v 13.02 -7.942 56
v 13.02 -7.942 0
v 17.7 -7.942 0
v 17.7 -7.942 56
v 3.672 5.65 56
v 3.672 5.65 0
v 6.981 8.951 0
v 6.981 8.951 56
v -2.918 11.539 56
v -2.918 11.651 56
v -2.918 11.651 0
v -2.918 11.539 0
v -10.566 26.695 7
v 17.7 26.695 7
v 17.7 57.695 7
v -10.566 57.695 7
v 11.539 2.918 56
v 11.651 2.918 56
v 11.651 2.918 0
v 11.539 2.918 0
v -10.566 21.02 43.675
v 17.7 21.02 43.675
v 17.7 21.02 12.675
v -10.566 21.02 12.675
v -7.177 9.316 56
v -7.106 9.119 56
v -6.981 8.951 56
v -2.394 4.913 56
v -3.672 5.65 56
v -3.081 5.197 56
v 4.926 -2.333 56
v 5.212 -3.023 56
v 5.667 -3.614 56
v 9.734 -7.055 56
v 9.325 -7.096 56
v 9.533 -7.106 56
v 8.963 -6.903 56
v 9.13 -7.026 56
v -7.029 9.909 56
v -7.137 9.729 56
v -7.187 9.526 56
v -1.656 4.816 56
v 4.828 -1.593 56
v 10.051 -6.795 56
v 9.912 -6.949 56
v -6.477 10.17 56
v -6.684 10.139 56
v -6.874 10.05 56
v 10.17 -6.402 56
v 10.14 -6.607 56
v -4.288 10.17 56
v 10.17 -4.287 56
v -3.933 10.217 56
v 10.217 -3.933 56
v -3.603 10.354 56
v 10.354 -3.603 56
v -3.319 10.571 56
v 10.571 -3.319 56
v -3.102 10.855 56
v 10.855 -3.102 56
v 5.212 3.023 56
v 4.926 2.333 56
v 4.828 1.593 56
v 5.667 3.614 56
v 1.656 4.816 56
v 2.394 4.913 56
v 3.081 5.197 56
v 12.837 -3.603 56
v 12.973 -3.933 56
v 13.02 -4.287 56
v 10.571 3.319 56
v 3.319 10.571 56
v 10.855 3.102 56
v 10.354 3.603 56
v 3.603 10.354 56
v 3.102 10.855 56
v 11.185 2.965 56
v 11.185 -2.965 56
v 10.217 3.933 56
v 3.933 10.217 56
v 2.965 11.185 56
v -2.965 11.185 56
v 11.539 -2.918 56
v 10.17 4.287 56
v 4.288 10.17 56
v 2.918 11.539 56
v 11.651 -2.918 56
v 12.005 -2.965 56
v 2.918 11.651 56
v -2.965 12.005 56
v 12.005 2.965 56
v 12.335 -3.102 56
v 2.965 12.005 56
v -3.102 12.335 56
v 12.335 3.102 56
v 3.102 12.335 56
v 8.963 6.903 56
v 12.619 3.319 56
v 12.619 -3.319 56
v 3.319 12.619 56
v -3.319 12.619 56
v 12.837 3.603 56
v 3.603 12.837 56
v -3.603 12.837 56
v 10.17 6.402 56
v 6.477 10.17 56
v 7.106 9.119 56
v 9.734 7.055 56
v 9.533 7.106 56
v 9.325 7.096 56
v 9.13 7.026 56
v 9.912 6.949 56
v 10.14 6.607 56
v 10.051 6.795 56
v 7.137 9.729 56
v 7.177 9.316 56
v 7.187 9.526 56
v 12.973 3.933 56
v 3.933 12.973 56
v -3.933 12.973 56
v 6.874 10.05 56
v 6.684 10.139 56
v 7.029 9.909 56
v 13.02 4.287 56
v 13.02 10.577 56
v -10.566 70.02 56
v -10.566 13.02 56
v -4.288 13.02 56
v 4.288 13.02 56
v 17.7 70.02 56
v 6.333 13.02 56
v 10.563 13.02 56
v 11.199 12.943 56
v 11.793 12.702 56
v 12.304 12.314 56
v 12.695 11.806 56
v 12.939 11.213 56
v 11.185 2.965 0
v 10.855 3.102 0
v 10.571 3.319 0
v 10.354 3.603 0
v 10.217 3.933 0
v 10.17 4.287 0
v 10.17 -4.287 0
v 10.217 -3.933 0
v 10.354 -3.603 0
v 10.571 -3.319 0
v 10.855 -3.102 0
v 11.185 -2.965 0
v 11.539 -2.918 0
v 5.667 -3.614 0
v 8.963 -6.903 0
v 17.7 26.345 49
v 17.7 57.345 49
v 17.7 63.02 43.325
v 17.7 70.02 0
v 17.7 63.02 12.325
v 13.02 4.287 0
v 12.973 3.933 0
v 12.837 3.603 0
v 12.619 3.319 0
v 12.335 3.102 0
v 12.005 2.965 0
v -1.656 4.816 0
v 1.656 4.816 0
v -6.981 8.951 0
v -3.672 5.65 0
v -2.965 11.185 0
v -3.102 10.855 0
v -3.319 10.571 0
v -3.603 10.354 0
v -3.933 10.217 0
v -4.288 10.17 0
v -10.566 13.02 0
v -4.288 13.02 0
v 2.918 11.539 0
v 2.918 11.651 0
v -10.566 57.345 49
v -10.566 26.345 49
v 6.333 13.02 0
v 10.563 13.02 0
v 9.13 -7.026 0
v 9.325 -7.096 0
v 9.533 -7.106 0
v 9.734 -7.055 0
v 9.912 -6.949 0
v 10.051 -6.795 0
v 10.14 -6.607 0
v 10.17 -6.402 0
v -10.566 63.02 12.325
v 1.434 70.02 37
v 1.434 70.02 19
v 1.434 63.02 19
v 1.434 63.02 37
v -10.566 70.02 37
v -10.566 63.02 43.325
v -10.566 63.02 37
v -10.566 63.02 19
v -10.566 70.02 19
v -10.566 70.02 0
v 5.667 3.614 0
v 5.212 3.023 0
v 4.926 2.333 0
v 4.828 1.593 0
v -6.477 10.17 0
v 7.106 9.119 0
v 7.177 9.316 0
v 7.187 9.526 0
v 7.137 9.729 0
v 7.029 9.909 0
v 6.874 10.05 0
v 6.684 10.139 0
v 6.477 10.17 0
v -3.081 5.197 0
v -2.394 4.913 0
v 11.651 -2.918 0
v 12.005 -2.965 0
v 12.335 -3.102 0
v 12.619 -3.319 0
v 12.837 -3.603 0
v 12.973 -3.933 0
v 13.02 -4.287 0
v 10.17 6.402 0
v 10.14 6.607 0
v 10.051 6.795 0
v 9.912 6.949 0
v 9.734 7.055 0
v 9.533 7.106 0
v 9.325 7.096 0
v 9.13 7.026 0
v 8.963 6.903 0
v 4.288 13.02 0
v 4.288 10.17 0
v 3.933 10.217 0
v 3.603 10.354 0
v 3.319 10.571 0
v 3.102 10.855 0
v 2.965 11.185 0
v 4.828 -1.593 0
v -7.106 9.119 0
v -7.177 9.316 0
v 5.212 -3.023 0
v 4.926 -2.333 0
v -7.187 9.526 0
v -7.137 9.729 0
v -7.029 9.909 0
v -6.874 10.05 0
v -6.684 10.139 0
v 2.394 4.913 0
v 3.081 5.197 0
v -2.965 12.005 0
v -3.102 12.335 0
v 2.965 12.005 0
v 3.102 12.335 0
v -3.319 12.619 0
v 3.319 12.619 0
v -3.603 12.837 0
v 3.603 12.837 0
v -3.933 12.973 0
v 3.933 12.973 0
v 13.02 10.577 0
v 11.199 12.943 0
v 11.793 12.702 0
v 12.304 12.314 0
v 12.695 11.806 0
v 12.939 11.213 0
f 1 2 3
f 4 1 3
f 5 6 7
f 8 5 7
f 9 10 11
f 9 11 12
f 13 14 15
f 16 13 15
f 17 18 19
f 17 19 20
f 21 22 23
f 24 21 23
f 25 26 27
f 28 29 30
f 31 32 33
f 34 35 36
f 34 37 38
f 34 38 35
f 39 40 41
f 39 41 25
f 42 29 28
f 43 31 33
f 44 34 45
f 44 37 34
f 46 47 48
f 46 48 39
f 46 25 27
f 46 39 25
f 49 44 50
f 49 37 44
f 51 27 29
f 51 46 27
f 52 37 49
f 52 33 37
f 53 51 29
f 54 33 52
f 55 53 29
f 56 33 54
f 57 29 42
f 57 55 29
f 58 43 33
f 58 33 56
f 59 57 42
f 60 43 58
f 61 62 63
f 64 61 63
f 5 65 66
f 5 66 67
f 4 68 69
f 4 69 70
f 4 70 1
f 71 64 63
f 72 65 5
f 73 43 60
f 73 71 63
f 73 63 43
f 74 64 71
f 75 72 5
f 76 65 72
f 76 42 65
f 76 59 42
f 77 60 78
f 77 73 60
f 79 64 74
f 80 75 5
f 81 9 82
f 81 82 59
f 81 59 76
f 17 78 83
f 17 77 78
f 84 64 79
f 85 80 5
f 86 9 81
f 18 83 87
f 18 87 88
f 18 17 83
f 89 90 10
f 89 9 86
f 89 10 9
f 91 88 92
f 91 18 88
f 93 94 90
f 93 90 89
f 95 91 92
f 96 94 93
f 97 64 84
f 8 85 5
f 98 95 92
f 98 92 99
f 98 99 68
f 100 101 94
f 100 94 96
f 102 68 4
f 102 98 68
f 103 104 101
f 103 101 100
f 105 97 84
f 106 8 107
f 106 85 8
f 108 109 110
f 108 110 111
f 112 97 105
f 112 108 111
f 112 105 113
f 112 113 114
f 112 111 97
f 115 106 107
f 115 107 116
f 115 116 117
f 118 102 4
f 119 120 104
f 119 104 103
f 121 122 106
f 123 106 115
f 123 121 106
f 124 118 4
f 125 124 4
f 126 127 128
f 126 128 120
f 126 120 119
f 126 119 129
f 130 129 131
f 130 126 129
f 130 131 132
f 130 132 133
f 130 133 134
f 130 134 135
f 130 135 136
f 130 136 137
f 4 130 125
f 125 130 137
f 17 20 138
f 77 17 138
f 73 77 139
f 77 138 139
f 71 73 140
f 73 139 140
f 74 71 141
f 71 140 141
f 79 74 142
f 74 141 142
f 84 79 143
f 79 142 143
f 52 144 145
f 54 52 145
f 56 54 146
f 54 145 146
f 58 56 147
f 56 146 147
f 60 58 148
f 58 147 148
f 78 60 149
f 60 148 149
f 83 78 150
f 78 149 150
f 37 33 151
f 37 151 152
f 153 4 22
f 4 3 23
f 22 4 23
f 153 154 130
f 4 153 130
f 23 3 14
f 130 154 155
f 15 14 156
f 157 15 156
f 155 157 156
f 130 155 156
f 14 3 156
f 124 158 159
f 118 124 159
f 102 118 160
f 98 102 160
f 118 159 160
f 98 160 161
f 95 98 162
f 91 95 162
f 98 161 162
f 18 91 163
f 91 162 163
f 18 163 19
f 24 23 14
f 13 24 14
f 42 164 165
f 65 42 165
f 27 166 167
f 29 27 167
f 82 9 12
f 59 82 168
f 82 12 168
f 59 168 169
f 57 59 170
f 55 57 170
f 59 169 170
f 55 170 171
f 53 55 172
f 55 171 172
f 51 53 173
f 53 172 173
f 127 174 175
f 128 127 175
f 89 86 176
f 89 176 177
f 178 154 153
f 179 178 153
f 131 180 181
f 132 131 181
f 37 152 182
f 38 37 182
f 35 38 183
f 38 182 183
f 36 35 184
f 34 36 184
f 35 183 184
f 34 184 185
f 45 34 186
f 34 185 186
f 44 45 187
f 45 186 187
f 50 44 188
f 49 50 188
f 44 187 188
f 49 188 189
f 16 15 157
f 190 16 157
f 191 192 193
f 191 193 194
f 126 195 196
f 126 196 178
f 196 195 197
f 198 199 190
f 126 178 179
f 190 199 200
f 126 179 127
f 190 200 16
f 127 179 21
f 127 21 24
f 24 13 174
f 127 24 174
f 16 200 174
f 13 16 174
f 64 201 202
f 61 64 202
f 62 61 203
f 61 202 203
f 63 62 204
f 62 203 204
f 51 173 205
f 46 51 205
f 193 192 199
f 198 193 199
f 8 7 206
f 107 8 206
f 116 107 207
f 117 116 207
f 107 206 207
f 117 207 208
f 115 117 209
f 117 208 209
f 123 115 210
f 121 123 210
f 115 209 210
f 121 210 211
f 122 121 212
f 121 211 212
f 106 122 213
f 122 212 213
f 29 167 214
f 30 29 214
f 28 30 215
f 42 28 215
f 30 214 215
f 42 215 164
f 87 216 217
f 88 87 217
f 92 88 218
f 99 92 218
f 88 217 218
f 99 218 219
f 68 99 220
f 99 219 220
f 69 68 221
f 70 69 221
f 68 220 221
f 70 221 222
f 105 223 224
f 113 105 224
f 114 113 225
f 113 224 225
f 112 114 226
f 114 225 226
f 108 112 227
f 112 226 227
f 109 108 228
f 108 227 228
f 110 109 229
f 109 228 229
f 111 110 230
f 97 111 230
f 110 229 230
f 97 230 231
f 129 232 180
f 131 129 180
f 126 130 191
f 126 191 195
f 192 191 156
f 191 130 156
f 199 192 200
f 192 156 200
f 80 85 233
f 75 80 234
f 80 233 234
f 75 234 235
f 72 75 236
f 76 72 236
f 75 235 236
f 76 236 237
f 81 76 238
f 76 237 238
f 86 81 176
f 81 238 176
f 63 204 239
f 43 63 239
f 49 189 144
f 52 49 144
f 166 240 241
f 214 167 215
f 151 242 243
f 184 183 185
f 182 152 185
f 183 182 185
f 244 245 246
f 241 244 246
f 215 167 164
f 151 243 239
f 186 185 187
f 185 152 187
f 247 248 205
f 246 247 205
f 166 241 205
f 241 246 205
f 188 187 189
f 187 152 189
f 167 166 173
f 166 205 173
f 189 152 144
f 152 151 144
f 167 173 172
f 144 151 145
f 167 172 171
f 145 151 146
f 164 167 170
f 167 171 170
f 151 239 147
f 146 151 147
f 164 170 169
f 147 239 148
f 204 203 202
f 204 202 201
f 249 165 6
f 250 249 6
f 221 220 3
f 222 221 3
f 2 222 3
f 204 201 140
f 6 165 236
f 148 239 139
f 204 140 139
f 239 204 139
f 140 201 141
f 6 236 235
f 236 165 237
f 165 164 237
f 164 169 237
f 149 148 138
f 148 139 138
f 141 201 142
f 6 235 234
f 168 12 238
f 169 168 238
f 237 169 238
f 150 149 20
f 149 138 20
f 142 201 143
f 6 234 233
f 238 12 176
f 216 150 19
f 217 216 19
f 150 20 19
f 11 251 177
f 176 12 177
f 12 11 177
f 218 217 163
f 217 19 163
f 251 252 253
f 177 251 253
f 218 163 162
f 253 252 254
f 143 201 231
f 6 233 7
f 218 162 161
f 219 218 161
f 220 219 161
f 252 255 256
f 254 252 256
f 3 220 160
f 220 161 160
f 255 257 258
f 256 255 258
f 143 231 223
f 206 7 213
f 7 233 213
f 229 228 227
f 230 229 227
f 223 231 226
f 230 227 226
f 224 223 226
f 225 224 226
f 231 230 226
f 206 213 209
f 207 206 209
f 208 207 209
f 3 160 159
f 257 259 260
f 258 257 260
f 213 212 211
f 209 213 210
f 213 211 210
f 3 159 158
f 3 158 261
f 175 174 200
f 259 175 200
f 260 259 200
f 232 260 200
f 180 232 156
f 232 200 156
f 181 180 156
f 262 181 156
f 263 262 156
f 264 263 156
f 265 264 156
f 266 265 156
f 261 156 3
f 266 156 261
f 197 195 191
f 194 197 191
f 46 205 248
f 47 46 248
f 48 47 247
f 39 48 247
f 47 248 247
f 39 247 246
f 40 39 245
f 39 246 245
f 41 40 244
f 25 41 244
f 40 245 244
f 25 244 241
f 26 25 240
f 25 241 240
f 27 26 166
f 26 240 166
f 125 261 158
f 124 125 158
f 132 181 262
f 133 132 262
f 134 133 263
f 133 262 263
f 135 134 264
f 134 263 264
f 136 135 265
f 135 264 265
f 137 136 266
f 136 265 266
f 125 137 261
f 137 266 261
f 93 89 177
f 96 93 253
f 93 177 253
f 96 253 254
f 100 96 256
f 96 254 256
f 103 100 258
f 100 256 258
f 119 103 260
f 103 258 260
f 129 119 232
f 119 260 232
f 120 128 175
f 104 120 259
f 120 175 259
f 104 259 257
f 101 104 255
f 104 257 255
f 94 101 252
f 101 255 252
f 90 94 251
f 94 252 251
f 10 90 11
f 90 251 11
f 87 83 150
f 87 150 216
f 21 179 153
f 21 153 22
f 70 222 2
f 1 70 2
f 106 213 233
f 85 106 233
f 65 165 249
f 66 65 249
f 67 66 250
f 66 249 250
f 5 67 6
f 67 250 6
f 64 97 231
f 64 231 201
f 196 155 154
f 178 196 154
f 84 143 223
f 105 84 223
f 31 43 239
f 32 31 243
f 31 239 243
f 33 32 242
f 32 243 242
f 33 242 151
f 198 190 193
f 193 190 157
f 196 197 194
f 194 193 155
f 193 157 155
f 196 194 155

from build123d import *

# Parameters (mm, degrees)
BOSS_EXTRUDE1_DEPTH = 56
CUT_EXTRUDE1_DEPTH  = 56
CUT_EXTRUDE2_DEPTH  = 10


with BuildPart() as part:
    # Sketch1 → Boss-Extrude1 (new body)
    with BuildSketch(Plane.XY):
        with BuildLine():
            Line((13.02, -7.9417418), (17.7, -7.9417418))
            Line((17.7, -7.9417418), (17.7, 70.02))
            Line((17.7, 70.02), (-10.566443095, 70.02))
            Line((-10.566443095, 70.02), (-10.566443095, 13.02))
            Line((-10.566443095, 13.02), (-5.317126718, 13.02))
            Line((-5.317126718, 13.02), (-4.287512407, 13.02))
            ThreePointArc((-4.287512407, 13.02), (-3.319474451, 12.619025549), (-2.9185, 11.650987593))
            Line((-2.9185, 11.650987593), (-2.9185, 11.539212407))
            ThreePointArc((-2.9185, 11.539212407), (-3.319474451, 10.571174451), (-4.287512407, 10.1702))
            Line((-4.287512407, 10.1702), (-6.476788598, 10.1702))
            ThreePointArc((-6.476788598, 10.1702), (-7.136510935, 9.729114651), (-6.981020848, 8.950903446))
            Line((-6.981020848, 8.950903446), (-3.672257405, 5.649701928))
            ThreePointArc((-3.672257405, 5.649701928), (-2.746830644, 5.032499411), (-1.655778399, 4.8158))
            Line((-1.655778399, 4.8158), (1.655778399, 4.8158))
            ThreePointArc((1.655778399, 4.8158), (2.746830644, 5.032499411), (3.672257405, 5.649701928))
            Line((3.672257405, 5.649701928), (6.981020848, 8.950903446))
            ThreePointArc((6.981020848, 8.950903446), (7.136510935, 9.729114651), (6.476788598, 10.1702))
            Line((6.476788598, 10.1702), (4.287512407, 10.1702))
            ThreePointArc((4.287512407, 10.1702), (3.319474451, 10.571174451), (2.9185, 11.539212407))
            Line((2.9185, 11.539212407), (2.9185, 11.650987593))
            ThreePointArc((2.9185, 11.650987593), (3.319474451, 12.619025549), (4.287512407, 13.02))
            Line((4.287512407, 13.02), (6.332886163, 13.02))
            Line((6.332886163, 13.02), (10.562594215, 13.019824354))
            ThreePointArc((10.562594215, 13.019824354), (12.303594776, 12.313982883), (13.019956614, 10.577284622))
            Line((13.019956614, 10.577284622), (13.02, 4.287469289))
            ThreePointArc((13.02, 4.287469289), (12.619025549, 3.319431332), (11.650987593, 2.918456882))
            Line((11.650987593, 2.918456882), (11.539212407, 2.918456882))
            ThreePointArc((11.539212407, 2.918456882), (10.571174451, 3.319431332), (10.1702, 4.287469289))
            Line((10.1702, 4.287469289), (10.1702, 6.402089023))
            ThreePointArc((10.1702, 6.402089023), (9.733877283, 7.055496588), (8.963146507, 6.90287605))
            Line((8.963146507, 6.90287605), (5.667020993, 3.614283579))
            ThreePointArc((5.667020993, 3.614283579), (5.046449321, 2.687255303), (4.8285, 1.593185507))
            Line((4.8285, 1.593185507), (4.8285, -1.593185507))
            ThreePointArc((4.8285, -1.593185507), (5.046449321, -2.687255303), (5.667020993, -3.614283579))
            Line((5.667020993, -3.614283579), (8.963146507, -6.90287605))
            ThreePointArc((8.963146507, -6.90287605), (9.733877283, -7.055496588), (10.1702, -6.402089023))
            Line((10.1702, -6.402089023), (10.1702, -4.287469289))
            ThreePointArc((10.1702, -4.287469289), (10.571174451, -3.319431332), (11.539212407, -2.918456882))
            Line((11.539212407, -2.918456882), (11.650987593, -2.918456882))
            ThreePointArc((11.650987593, -2.918456882), (12.619025549, -3.319431332), (13.02, -4.287469289))
            Line((13.02, -4.287469289), (13.02, -5.3170836))
            Line((13.02, -5.3170836), (13.02, -7.9417418))
        make_face()
    extrude(amount=BOSS_EXTRUDE1_DEPTH)

    # Sketch14 → Cut-Extrude1 (cut)
    with BuildSketch(Plane(origin=(17.7, 0, 0), x_dir=(0, 0, -1), z_dir=(1, 0, 0))):
        Polygon((-43.675189669, 21.02), (-12.675189669, 21.02), (-7, 26.695189669), (-7, 57.695189669), (-12.324810331, 63.02), (-43.324810331, 63.02), (-49, 57.344810331), (-49, 26.344810331), align=None)
    extrude(amount=-CUT_EXTRUDE1_DEPTH, mode=Mode.SUBTRACT)

    # Sketch15 → Cut-Extrude2 (cut)
    with BuildSketch(Plane(origin=(0, 70.02, 0), x_dir=(1, 0, 0), z_dir=(0, 1, 0))):
        Polygon((-10.566443095, -19), (1.433556905, -19), (1.433556905, -37), (-10.566443095, -37), (-15.100276482, -37), (-15.100276482, -19), align=None)
    extrude(amount=-CUT_EXTRUDE2_DEPTH, mode=Mode.SUBTRACT)


solid = part.part
